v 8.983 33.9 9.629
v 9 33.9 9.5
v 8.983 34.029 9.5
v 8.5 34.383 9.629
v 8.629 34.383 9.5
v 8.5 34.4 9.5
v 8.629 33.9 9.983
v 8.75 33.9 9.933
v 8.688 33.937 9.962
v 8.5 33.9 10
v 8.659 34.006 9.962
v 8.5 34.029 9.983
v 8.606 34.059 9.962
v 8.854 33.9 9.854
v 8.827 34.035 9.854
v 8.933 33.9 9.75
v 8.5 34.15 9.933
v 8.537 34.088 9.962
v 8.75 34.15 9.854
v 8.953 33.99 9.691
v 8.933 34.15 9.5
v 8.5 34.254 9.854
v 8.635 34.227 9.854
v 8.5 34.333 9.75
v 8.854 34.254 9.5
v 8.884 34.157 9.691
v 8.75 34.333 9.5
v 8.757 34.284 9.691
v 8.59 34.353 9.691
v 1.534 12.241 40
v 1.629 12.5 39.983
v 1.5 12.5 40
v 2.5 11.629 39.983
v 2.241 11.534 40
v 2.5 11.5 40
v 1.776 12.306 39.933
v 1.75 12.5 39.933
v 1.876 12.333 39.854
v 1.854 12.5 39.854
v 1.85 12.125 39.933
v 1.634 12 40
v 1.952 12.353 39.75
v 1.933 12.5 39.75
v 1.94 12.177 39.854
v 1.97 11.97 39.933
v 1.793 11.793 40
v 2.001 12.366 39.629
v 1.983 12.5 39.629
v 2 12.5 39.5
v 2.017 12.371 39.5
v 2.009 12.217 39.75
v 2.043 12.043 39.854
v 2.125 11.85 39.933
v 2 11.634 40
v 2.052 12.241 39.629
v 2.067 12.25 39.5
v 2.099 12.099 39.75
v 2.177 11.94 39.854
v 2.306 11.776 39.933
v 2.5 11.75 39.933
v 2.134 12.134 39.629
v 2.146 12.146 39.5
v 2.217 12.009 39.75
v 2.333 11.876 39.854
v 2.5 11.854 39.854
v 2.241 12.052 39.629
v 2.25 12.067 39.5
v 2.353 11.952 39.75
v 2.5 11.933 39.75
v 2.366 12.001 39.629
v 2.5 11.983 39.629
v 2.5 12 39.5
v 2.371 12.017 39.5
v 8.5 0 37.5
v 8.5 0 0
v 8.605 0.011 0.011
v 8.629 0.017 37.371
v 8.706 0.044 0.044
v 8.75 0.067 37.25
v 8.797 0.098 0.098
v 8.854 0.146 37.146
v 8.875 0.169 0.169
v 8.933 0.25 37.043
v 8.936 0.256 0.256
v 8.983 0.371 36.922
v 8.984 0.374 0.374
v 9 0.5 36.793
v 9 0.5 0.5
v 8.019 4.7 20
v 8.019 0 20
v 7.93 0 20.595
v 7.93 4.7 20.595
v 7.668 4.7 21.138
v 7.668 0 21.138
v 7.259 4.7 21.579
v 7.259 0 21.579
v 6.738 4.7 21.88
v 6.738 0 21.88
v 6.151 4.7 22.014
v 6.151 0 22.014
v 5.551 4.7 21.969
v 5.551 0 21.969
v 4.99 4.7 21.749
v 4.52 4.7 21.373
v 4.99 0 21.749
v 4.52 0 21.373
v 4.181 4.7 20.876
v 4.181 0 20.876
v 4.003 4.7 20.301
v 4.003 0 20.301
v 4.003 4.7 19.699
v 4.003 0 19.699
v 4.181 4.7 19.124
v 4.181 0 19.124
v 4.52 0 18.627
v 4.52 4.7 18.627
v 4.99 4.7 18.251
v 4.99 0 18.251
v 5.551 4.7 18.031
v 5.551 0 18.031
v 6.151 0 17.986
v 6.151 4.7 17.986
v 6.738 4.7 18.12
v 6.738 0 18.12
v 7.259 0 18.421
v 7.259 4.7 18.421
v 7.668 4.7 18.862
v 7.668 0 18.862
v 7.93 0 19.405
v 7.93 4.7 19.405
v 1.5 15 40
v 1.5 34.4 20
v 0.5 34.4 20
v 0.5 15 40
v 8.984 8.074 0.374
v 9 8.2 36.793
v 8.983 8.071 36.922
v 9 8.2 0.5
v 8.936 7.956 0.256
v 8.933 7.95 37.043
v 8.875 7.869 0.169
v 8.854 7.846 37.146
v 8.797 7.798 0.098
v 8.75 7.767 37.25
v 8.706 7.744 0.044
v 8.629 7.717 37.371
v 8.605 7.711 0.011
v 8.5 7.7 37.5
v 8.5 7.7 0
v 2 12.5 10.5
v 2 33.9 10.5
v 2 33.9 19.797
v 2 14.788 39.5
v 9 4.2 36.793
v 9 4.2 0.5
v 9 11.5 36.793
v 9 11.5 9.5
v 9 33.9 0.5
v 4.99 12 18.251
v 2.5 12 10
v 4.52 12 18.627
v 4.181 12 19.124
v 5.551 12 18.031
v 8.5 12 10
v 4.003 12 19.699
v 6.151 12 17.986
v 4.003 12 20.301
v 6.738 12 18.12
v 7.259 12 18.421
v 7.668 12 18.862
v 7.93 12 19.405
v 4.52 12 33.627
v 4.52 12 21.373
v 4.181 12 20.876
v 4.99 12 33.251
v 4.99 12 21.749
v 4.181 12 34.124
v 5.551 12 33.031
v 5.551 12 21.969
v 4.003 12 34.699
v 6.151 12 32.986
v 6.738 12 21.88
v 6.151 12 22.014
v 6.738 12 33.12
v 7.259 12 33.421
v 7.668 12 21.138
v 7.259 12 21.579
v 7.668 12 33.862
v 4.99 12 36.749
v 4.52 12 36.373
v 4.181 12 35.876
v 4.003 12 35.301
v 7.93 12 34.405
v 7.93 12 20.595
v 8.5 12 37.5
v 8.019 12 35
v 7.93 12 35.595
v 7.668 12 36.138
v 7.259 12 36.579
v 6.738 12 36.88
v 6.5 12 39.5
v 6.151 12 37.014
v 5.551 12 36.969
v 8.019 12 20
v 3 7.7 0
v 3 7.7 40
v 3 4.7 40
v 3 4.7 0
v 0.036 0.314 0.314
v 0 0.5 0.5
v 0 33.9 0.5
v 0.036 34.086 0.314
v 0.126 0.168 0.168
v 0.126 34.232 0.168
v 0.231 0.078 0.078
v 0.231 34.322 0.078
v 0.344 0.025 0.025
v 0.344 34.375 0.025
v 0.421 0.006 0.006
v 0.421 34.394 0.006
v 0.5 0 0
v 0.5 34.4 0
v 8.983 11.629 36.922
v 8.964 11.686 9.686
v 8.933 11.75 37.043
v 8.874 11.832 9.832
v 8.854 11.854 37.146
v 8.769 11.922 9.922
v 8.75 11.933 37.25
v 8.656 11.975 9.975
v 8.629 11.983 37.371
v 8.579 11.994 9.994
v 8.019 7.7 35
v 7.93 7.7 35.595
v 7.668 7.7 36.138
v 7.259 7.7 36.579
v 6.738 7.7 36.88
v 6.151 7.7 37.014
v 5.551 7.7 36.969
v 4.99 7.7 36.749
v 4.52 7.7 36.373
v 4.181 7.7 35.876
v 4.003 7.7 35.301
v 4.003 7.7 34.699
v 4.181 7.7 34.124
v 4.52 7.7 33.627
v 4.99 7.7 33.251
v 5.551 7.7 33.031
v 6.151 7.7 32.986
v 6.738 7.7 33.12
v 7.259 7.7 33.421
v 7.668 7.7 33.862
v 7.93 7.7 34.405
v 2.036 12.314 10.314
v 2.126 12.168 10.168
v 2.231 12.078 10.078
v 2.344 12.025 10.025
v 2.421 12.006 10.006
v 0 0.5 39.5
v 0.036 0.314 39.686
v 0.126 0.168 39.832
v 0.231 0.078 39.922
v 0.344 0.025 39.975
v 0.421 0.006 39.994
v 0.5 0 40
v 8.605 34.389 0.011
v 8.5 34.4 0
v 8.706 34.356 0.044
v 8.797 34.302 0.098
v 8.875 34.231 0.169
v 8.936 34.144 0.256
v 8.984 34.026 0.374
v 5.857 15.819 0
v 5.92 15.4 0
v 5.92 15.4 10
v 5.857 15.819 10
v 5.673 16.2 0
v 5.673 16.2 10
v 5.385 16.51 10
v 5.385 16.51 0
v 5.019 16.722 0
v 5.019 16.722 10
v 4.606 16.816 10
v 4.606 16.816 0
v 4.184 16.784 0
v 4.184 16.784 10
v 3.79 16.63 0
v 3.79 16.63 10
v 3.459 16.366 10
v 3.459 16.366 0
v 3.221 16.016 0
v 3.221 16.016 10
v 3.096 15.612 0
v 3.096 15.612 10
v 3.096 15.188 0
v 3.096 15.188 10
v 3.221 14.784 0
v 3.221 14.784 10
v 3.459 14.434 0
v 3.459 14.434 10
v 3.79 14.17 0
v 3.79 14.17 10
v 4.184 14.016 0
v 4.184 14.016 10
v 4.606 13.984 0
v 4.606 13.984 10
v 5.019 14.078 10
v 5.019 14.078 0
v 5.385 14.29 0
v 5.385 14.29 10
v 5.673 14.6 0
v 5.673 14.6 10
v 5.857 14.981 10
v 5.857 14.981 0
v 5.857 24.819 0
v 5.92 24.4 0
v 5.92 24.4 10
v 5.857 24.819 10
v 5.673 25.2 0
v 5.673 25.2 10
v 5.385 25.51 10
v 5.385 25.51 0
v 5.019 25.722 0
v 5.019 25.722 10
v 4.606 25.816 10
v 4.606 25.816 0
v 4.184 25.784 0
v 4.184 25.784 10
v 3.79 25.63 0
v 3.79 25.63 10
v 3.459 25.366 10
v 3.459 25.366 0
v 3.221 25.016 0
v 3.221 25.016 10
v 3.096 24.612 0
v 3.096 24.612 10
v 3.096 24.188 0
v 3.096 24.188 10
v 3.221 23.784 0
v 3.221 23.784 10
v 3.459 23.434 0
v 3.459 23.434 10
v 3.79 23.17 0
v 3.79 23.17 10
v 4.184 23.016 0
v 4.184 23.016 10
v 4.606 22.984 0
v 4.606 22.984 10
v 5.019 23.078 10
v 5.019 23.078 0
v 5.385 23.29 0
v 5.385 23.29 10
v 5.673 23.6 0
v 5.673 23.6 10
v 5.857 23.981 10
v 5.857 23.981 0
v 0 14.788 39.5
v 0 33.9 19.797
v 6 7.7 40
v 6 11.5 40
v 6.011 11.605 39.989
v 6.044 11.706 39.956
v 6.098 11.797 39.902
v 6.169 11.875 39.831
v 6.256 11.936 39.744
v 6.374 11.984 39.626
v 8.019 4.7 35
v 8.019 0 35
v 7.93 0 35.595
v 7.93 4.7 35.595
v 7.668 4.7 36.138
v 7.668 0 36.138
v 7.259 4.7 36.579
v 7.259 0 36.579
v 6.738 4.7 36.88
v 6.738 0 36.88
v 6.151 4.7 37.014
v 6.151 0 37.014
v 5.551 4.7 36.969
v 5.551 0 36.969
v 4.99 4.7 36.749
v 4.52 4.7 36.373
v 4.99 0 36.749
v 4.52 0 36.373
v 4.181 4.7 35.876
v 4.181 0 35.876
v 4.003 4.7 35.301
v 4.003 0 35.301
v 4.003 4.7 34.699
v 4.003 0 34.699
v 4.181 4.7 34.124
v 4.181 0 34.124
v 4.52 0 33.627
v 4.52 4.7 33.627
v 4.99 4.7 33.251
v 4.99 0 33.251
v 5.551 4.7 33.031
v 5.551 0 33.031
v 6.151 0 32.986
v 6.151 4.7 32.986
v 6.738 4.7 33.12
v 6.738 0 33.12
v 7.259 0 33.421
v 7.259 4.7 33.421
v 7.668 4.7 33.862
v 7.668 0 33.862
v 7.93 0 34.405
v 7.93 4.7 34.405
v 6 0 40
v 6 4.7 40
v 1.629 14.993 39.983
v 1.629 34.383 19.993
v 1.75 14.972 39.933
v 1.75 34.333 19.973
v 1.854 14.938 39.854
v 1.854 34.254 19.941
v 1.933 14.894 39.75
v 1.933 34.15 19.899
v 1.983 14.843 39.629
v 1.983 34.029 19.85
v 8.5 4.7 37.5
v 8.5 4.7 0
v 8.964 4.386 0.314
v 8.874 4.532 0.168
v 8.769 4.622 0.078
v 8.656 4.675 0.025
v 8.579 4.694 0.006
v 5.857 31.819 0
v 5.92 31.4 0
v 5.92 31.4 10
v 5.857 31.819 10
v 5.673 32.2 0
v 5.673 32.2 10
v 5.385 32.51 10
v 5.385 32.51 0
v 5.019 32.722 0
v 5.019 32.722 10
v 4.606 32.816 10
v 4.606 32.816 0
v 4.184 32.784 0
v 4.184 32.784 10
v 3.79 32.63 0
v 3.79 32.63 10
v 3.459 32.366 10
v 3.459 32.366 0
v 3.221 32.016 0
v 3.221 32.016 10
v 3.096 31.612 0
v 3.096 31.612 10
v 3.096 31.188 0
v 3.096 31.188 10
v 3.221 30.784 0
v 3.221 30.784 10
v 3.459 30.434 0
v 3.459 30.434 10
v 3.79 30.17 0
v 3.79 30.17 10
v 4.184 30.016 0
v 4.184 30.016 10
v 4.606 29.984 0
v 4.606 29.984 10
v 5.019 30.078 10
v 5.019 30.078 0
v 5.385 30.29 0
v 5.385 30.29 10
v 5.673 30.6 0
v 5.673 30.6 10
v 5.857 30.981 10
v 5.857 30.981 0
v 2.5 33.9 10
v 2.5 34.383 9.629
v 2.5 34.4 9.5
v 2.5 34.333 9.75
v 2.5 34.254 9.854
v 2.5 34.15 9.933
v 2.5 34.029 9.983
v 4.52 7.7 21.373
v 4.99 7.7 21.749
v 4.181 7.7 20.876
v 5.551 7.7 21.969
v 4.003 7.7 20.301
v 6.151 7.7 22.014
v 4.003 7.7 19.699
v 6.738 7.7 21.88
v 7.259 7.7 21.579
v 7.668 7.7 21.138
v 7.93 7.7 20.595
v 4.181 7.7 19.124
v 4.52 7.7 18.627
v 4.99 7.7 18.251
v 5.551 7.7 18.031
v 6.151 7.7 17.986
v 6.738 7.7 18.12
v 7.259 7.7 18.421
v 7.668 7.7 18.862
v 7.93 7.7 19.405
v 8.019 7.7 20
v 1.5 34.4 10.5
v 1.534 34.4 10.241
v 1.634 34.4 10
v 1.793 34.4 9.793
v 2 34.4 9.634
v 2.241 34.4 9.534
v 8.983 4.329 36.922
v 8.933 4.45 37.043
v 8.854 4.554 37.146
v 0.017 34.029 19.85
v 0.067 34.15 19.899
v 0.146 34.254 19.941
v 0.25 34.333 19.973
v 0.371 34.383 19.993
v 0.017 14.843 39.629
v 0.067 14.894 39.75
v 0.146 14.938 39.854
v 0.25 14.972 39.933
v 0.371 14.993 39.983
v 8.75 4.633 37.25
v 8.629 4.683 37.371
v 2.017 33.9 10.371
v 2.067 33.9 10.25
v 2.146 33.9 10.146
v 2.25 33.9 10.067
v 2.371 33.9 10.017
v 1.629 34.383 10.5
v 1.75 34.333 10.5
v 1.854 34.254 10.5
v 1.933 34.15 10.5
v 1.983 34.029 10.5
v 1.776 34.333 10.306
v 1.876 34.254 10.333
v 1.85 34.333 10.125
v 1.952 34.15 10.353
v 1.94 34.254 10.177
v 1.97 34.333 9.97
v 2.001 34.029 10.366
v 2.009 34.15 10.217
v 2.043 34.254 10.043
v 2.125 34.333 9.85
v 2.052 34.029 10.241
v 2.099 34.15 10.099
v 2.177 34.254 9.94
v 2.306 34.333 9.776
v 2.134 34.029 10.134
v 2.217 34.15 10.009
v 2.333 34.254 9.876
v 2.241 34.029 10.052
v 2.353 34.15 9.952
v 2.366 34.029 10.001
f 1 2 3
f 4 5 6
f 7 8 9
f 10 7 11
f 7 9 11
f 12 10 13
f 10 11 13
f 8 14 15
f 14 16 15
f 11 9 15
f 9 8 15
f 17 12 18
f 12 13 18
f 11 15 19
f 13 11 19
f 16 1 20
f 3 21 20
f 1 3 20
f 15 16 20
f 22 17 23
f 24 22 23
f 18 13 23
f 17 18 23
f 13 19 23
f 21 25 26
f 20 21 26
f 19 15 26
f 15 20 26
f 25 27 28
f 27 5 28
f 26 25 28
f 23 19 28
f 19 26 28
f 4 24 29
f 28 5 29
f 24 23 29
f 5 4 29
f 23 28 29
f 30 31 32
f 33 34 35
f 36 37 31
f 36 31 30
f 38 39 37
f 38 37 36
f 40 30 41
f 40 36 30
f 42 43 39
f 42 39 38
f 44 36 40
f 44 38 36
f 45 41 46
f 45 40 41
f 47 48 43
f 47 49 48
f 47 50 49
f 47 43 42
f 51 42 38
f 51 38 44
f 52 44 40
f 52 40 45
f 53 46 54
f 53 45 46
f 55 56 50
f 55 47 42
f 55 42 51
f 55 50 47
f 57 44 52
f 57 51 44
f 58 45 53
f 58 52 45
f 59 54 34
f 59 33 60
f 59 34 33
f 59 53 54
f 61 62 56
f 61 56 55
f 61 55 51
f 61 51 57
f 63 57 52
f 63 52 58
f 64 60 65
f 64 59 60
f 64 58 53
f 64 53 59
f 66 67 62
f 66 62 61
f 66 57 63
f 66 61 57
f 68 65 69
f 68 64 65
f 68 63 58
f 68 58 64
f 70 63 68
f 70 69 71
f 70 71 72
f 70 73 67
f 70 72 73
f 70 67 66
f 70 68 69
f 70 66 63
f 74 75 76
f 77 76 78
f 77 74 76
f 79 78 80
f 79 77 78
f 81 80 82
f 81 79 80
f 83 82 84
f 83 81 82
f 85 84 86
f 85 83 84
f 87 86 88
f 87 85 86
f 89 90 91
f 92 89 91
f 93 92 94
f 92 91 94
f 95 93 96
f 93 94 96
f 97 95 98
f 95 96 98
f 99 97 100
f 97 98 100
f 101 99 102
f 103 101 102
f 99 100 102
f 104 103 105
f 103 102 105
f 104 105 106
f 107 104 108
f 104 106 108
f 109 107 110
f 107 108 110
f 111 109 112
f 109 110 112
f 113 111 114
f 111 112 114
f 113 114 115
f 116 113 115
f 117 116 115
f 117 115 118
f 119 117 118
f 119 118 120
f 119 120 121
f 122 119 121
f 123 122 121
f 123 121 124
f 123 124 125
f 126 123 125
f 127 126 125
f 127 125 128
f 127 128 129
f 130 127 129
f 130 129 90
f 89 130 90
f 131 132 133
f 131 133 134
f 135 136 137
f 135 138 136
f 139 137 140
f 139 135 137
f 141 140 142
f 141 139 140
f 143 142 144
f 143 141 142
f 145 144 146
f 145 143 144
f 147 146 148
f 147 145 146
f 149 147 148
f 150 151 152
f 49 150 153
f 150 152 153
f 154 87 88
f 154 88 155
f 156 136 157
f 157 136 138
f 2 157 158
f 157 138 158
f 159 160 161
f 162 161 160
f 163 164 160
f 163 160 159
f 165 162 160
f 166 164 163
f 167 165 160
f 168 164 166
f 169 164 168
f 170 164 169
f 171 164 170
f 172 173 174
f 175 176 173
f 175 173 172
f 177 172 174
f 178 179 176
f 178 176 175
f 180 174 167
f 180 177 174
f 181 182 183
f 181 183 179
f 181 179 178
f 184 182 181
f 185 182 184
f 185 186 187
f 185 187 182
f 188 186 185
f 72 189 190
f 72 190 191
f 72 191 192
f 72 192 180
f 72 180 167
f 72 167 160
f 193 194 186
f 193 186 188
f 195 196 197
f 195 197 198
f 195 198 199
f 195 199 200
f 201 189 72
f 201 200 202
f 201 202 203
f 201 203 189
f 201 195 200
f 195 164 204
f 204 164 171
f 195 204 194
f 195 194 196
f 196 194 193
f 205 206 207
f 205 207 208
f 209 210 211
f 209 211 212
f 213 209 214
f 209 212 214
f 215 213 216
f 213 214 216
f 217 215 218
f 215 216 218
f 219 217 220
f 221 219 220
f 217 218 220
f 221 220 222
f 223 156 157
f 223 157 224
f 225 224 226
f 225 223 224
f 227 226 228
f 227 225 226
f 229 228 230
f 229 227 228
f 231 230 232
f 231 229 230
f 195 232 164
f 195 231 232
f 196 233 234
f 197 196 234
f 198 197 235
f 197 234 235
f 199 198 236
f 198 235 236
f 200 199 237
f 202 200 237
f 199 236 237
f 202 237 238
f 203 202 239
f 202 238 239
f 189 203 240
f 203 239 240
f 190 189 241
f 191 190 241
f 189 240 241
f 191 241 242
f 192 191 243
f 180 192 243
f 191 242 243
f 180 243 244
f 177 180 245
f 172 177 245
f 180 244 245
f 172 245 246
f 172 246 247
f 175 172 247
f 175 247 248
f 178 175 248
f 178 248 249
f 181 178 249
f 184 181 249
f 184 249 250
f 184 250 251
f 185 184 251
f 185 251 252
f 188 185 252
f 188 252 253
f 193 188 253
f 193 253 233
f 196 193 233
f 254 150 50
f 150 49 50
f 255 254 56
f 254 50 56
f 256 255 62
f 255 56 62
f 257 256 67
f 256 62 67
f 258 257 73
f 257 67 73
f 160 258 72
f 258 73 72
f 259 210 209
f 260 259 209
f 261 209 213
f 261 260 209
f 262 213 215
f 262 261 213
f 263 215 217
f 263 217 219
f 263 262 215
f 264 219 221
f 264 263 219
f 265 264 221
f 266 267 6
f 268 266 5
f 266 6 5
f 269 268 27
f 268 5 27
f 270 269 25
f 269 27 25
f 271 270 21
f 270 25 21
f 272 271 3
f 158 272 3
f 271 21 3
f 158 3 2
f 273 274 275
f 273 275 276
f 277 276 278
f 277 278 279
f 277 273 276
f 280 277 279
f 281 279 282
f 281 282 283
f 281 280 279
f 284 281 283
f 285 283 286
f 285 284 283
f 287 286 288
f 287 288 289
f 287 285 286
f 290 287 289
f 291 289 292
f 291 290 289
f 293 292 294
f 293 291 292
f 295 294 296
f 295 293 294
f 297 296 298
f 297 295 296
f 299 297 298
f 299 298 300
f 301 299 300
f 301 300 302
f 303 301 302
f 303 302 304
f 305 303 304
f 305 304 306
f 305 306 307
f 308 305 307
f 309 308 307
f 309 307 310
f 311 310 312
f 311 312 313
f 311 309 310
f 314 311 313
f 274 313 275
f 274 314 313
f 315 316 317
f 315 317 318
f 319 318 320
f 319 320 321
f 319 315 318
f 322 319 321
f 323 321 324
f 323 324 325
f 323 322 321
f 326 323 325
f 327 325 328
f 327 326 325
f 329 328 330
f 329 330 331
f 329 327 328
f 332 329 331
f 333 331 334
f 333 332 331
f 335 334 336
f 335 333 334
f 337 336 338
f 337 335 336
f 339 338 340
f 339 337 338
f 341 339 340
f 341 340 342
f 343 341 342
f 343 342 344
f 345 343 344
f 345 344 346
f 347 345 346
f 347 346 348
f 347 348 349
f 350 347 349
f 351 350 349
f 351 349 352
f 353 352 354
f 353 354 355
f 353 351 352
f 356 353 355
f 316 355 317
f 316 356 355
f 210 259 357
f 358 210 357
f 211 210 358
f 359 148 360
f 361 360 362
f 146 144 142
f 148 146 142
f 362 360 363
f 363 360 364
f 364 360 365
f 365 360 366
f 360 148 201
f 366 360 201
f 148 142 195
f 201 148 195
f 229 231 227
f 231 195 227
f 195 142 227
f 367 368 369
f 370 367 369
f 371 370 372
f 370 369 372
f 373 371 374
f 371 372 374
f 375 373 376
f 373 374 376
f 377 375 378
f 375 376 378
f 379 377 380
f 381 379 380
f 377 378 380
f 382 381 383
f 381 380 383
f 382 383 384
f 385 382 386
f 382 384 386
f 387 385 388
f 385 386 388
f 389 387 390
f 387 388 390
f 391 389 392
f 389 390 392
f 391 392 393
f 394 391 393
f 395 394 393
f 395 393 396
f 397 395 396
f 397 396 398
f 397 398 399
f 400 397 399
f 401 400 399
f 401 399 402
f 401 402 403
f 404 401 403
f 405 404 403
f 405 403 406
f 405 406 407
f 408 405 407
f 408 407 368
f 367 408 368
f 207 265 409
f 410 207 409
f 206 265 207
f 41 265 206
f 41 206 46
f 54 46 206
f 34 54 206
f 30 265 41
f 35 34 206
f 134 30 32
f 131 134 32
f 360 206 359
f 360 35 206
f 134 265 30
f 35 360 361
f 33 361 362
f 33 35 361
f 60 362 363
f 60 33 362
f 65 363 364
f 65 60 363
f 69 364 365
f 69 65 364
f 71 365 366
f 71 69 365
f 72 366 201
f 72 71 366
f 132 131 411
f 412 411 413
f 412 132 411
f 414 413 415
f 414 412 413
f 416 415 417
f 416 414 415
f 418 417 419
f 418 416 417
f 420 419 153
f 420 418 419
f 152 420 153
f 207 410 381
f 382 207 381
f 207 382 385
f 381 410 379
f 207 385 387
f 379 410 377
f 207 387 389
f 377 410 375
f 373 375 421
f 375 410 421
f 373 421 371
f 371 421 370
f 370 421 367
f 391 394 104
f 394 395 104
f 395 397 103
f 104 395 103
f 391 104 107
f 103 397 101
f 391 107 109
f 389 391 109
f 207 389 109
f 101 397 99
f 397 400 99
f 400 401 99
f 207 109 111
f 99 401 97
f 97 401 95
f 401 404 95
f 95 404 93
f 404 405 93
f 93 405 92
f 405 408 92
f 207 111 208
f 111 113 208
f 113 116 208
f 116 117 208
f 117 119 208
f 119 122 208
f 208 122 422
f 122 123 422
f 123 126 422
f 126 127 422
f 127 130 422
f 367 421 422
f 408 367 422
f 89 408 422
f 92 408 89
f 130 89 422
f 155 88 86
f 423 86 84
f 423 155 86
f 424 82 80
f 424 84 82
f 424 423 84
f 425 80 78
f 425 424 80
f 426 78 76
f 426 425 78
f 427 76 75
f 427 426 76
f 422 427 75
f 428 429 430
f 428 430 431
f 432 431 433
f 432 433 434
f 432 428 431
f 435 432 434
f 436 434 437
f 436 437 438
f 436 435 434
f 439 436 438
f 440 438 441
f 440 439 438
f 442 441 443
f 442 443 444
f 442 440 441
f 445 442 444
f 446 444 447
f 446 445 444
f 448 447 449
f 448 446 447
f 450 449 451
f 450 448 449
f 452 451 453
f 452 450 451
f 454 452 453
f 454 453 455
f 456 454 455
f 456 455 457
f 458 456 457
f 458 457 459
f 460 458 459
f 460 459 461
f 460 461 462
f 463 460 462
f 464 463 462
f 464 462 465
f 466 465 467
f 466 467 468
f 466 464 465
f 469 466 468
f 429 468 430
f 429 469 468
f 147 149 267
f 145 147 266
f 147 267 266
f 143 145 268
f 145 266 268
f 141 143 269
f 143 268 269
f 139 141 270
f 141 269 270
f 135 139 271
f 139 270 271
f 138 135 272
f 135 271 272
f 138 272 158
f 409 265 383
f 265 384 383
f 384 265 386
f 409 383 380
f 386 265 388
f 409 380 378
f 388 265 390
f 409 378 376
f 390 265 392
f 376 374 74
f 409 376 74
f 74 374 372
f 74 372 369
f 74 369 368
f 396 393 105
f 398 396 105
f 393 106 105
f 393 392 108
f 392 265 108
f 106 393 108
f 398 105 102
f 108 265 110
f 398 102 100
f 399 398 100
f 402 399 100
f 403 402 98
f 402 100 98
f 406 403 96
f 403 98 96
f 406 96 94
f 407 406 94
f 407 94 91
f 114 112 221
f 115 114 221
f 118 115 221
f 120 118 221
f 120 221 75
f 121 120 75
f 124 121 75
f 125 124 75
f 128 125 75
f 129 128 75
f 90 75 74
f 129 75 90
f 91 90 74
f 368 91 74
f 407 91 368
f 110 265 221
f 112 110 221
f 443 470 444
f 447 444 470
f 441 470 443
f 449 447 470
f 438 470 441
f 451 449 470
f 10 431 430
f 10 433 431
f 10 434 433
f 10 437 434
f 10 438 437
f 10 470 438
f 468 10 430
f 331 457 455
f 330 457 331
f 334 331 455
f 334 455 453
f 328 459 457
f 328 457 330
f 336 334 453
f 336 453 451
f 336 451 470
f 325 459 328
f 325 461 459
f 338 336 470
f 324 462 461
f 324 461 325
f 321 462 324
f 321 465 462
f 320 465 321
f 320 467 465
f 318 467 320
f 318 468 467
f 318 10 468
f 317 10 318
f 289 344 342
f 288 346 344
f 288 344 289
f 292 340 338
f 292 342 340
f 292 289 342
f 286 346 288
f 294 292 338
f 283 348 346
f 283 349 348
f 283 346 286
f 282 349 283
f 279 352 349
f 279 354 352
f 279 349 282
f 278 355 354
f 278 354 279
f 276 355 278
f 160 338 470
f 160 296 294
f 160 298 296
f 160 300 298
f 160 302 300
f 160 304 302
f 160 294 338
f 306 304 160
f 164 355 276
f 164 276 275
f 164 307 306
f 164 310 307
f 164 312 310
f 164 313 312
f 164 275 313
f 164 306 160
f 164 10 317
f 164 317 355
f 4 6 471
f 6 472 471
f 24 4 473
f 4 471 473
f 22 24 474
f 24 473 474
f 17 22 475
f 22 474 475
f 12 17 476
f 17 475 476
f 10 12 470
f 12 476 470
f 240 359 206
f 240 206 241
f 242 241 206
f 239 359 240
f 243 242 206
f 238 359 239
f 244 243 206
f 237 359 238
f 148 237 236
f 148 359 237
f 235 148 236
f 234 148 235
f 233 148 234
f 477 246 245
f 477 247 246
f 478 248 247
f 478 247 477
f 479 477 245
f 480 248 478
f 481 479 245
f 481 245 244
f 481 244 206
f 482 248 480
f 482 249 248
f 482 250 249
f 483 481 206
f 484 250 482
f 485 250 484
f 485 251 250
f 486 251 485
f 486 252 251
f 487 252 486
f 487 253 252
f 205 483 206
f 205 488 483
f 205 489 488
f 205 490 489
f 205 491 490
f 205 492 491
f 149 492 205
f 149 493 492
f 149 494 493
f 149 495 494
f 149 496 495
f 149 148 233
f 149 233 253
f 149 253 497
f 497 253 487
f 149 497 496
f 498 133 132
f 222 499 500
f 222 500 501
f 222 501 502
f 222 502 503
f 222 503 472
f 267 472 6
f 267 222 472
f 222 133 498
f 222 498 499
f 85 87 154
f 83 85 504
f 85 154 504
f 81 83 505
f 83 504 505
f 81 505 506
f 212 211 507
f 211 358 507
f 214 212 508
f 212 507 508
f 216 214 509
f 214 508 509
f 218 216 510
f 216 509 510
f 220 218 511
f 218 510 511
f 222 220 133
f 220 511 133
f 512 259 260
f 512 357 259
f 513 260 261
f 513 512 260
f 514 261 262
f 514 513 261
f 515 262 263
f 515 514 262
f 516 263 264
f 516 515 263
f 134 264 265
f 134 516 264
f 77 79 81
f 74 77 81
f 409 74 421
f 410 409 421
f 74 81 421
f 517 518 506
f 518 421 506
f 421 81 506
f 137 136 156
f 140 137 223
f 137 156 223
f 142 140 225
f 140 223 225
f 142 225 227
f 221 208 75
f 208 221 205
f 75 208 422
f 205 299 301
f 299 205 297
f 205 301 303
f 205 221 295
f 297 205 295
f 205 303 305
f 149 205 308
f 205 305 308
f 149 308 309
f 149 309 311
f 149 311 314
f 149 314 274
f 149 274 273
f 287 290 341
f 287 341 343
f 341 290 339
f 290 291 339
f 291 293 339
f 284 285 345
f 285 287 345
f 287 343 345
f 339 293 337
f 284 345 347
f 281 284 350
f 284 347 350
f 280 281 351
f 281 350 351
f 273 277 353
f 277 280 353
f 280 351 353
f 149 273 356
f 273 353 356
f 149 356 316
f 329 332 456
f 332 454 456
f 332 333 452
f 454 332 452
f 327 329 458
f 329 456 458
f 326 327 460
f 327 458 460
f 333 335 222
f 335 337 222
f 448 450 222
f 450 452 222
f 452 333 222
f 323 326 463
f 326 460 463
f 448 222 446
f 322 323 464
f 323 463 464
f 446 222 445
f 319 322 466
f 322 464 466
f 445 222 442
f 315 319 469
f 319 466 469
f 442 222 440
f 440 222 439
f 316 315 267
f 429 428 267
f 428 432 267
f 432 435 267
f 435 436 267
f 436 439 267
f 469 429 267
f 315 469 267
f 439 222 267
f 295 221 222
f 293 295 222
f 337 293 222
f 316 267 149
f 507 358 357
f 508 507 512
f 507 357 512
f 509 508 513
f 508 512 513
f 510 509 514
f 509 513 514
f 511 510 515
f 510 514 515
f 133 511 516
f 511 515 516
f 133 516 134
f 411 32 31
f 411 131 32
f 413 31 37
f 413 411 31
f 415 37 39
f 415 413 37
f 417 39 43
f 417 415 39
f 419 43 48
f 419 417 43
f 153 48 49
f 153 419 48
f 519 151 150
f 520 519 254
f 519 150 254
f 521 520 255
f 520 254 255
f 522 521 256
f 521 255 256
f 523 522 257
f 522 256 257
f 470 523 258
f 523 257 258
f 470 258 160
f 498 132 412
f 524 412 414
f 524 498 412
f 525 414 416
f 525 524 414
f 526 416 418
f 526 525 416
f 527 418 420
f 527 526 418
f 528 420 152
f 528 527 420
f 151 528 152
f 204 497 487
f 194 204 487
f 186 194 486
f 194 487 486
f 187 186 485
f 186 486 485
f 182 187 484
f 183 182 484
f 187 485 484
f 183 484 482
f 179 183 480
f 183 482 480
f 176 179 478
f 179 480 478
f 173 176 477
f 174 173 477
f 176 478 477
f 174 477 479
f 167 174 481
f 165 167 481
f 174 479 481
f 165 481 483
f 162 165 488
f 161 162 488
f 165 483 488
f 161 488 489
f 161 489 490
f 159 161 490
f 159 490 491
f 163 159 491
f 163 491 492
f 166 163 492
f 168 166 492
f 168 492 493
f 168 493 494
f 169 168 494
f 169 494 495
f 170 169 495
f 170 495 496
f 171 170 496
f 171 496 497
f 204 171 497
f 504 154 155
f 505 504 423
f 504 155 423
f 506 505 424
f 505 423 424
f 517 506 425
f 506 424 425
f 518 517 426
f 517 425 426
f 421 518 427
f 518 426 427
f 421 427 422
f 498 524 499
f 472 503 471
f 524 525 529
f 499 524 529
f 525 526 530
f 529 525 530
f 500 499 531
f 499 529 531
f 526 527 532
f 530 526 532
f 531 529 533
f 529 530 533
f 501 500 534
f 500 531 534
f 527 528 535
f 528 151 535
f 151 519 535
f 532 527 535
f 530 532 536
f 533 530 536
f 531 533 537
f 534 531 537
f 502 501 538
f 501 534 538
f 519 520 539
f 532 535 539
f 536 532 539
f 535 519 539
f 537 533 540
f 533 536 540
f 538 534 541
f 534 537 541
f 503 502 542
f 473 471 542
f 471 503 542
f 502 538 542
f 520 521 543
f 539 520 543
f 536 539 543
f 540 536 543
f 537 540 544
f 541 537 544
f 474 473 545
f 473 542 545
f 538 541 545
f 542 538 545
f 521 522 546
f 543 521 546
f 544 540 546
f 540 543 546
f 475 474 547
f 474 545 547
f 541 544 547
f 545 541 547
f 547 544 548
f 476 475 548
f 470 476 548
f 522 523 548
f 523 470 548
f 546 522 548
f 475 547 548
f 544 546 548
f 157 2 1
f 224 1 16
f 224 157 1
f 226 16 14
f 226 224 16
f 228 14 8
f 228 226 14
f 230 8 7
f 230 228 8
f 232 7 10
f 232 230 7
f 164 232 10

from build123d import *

# Parameters (mm, degrees)
SKETCH1_W           = 9
SKETCH1_H           = 34.4
SKETCH1_R           = 1.42
BOSS_EXTRUDE1_DEPTH = 40
SKETCH1_3_R         = 1.42
CUT_EXTRUDE1_DEPTH  = 10
SKETCH2_W           = 40
SKETCH2_H           = 3
CUT_EXTRUDE2_DEPTH  = 6
CUT_EXTRUDE3_DEPTH  = 9
CUT_EXTRUDE6_DEPTH  = 7
SKETCH6_R           = 2.0193
CUT_EXTRUDE5_DEPTH  = 20
FILLET2_R           = 0.5
CHAMFER4_SIZE       = 3
FILLET3_R           = 0.5


with BuildPart() as part:
    # Sketch1 → Boss-Extrude1 (new body)
    with BuildSketch(Plane.XY):
        with Locations((4.5, 17.2)):
            Rectangle(SKETCH1_W, SKETCH1_H)
        with Locations((4.5, 15.4)):
            Circle(SKETCH1_R, mode=Mode.SUBTRACT)
        with Locations((4.5, 24.4)):
            Circle(SKETCH1_R, mode=Mode.SUBTRACT)
        with Locations((4.5, 24.4)):
            Circle(SKETCH1_R)
        with Locations((4.5, 15.4)):
            Circle(SKETCH1_R)
        with Locations((4.5, 31.4)):
            Circle(SKETCH1_R)
    extrude(amount=BOSS_EXTRUDE1_DEPTH)

    # Sketch1<3> → Cut-Extrude1 (cut)
    with BuildSketch(Plane.XY):
        with Locations((4.5, 24.4)):
            Circle(SKETCH1_3_R)
        with Locations((4.5, 31.4)):
            Circle(SKETCH1_3_R)
        with Locations((4.5, 15.4)):
            Circle(SKETCH1_3_R)
    extrude(amount=CUT_EXTRUDE1_DEPTH, mode=Mode.SUBTRACT)

    # Sketch2 → Cut-Extrude2 (cut)
    with BuildSketch(Plane(origin=(9, 0, 0), x_dir=(0, 0, -1), z_dir=(1, 0, 0))):
        with Locations((-20, 6.2)):
            Rectangle(SKETCH2_W, SKETCH2_H)
    extrude(amount=-CUT_EXTRUDE2_DEPTH, mode=Mode.SUBTRACT)

    # Sketch3 → Cut-Extrude3 (cut)
    with BuildSketch(Plane(origin=(9, 0, 0), x_dir=(0, 0, -1), z_dir=(1, 0, 0))):
        Polygon((-20, 34.4), (-40, 15), (-48.379363257, 51.913157268), align=None)
    extrude(amount=-CUT_EXTRUDE3_DEPTH, mode=Mode.SUBTRACT)

    # Sketch5 → Cut-Extrude6 (cut)
    with BuildSketch(Plane.ZY.offset(-9)):
        Polygon((20, 34.4), (10, 34.4), (10, 12), (40, 12), (40, 15), align=None)
    extrude(amount=CUT_EXTRUDE6_DEPTH, mode=Mode.SUBTRACT)

    # Sketch6 → Cut-Extrude5 (cut)
    with BuildSketch(Plane.XZ):
        with Locations((6, 35)):
            Circle(SKETCH6_R)
        with Locations((6, 20)):
            Circle(SKETCH6_R)
    extrude(amount=-CUT_EXTRUDE5_DEPTH, mode=Mode.SUBTRACT)

    # Fillet2
    fillet2_edges = [part.edges().sort_by_distance(p)[0] for p in [
        (0, 0, 20),
        (0, 7.5, 40),
        (0, 34.4, 10),
        (0, 24.7, 30),
        (0, 17.2, 0),
    ]]
    fillet(fillet2_edges, radius=FILLET2_R)

    # Chamfer4
    chamfer4_edges = [part.edges().sort_by_distance(p)[0] for p in [
        (9, 2.35, 40),
        (9, 9.85, 40),
    ]]
    chamfer(chamfer4_edges, length=CHAMFER4_SIZE)

    # Fillet3
    fillet3_edges = [part.edges().sort_by_distance(p)[0] for p in [
        (9, 4.7, 18.5),
        (9, 0, 18.5),
        (9, 2.35, 37),
        (9, 9.85, 37),
        (9, 21.05, 0),
        (9, 7.7, 18.5),
        (9, 34.4, 5),
        (9, 12, 23.5),
        (2, 13.5, 40),
        (4, 12, 40),
        (2, 24.7, 30),
        (2, 34.4, 15),
        (9, 23.2, 10),
        (5.5, 34.4, 10),
        (2, 12, 25),
        (2, 23.2, 10),
        (9, 2.35, 0),
    ]]
    fillet(fillet3_edges, radius=FILLET3_R)


solid = part.part
